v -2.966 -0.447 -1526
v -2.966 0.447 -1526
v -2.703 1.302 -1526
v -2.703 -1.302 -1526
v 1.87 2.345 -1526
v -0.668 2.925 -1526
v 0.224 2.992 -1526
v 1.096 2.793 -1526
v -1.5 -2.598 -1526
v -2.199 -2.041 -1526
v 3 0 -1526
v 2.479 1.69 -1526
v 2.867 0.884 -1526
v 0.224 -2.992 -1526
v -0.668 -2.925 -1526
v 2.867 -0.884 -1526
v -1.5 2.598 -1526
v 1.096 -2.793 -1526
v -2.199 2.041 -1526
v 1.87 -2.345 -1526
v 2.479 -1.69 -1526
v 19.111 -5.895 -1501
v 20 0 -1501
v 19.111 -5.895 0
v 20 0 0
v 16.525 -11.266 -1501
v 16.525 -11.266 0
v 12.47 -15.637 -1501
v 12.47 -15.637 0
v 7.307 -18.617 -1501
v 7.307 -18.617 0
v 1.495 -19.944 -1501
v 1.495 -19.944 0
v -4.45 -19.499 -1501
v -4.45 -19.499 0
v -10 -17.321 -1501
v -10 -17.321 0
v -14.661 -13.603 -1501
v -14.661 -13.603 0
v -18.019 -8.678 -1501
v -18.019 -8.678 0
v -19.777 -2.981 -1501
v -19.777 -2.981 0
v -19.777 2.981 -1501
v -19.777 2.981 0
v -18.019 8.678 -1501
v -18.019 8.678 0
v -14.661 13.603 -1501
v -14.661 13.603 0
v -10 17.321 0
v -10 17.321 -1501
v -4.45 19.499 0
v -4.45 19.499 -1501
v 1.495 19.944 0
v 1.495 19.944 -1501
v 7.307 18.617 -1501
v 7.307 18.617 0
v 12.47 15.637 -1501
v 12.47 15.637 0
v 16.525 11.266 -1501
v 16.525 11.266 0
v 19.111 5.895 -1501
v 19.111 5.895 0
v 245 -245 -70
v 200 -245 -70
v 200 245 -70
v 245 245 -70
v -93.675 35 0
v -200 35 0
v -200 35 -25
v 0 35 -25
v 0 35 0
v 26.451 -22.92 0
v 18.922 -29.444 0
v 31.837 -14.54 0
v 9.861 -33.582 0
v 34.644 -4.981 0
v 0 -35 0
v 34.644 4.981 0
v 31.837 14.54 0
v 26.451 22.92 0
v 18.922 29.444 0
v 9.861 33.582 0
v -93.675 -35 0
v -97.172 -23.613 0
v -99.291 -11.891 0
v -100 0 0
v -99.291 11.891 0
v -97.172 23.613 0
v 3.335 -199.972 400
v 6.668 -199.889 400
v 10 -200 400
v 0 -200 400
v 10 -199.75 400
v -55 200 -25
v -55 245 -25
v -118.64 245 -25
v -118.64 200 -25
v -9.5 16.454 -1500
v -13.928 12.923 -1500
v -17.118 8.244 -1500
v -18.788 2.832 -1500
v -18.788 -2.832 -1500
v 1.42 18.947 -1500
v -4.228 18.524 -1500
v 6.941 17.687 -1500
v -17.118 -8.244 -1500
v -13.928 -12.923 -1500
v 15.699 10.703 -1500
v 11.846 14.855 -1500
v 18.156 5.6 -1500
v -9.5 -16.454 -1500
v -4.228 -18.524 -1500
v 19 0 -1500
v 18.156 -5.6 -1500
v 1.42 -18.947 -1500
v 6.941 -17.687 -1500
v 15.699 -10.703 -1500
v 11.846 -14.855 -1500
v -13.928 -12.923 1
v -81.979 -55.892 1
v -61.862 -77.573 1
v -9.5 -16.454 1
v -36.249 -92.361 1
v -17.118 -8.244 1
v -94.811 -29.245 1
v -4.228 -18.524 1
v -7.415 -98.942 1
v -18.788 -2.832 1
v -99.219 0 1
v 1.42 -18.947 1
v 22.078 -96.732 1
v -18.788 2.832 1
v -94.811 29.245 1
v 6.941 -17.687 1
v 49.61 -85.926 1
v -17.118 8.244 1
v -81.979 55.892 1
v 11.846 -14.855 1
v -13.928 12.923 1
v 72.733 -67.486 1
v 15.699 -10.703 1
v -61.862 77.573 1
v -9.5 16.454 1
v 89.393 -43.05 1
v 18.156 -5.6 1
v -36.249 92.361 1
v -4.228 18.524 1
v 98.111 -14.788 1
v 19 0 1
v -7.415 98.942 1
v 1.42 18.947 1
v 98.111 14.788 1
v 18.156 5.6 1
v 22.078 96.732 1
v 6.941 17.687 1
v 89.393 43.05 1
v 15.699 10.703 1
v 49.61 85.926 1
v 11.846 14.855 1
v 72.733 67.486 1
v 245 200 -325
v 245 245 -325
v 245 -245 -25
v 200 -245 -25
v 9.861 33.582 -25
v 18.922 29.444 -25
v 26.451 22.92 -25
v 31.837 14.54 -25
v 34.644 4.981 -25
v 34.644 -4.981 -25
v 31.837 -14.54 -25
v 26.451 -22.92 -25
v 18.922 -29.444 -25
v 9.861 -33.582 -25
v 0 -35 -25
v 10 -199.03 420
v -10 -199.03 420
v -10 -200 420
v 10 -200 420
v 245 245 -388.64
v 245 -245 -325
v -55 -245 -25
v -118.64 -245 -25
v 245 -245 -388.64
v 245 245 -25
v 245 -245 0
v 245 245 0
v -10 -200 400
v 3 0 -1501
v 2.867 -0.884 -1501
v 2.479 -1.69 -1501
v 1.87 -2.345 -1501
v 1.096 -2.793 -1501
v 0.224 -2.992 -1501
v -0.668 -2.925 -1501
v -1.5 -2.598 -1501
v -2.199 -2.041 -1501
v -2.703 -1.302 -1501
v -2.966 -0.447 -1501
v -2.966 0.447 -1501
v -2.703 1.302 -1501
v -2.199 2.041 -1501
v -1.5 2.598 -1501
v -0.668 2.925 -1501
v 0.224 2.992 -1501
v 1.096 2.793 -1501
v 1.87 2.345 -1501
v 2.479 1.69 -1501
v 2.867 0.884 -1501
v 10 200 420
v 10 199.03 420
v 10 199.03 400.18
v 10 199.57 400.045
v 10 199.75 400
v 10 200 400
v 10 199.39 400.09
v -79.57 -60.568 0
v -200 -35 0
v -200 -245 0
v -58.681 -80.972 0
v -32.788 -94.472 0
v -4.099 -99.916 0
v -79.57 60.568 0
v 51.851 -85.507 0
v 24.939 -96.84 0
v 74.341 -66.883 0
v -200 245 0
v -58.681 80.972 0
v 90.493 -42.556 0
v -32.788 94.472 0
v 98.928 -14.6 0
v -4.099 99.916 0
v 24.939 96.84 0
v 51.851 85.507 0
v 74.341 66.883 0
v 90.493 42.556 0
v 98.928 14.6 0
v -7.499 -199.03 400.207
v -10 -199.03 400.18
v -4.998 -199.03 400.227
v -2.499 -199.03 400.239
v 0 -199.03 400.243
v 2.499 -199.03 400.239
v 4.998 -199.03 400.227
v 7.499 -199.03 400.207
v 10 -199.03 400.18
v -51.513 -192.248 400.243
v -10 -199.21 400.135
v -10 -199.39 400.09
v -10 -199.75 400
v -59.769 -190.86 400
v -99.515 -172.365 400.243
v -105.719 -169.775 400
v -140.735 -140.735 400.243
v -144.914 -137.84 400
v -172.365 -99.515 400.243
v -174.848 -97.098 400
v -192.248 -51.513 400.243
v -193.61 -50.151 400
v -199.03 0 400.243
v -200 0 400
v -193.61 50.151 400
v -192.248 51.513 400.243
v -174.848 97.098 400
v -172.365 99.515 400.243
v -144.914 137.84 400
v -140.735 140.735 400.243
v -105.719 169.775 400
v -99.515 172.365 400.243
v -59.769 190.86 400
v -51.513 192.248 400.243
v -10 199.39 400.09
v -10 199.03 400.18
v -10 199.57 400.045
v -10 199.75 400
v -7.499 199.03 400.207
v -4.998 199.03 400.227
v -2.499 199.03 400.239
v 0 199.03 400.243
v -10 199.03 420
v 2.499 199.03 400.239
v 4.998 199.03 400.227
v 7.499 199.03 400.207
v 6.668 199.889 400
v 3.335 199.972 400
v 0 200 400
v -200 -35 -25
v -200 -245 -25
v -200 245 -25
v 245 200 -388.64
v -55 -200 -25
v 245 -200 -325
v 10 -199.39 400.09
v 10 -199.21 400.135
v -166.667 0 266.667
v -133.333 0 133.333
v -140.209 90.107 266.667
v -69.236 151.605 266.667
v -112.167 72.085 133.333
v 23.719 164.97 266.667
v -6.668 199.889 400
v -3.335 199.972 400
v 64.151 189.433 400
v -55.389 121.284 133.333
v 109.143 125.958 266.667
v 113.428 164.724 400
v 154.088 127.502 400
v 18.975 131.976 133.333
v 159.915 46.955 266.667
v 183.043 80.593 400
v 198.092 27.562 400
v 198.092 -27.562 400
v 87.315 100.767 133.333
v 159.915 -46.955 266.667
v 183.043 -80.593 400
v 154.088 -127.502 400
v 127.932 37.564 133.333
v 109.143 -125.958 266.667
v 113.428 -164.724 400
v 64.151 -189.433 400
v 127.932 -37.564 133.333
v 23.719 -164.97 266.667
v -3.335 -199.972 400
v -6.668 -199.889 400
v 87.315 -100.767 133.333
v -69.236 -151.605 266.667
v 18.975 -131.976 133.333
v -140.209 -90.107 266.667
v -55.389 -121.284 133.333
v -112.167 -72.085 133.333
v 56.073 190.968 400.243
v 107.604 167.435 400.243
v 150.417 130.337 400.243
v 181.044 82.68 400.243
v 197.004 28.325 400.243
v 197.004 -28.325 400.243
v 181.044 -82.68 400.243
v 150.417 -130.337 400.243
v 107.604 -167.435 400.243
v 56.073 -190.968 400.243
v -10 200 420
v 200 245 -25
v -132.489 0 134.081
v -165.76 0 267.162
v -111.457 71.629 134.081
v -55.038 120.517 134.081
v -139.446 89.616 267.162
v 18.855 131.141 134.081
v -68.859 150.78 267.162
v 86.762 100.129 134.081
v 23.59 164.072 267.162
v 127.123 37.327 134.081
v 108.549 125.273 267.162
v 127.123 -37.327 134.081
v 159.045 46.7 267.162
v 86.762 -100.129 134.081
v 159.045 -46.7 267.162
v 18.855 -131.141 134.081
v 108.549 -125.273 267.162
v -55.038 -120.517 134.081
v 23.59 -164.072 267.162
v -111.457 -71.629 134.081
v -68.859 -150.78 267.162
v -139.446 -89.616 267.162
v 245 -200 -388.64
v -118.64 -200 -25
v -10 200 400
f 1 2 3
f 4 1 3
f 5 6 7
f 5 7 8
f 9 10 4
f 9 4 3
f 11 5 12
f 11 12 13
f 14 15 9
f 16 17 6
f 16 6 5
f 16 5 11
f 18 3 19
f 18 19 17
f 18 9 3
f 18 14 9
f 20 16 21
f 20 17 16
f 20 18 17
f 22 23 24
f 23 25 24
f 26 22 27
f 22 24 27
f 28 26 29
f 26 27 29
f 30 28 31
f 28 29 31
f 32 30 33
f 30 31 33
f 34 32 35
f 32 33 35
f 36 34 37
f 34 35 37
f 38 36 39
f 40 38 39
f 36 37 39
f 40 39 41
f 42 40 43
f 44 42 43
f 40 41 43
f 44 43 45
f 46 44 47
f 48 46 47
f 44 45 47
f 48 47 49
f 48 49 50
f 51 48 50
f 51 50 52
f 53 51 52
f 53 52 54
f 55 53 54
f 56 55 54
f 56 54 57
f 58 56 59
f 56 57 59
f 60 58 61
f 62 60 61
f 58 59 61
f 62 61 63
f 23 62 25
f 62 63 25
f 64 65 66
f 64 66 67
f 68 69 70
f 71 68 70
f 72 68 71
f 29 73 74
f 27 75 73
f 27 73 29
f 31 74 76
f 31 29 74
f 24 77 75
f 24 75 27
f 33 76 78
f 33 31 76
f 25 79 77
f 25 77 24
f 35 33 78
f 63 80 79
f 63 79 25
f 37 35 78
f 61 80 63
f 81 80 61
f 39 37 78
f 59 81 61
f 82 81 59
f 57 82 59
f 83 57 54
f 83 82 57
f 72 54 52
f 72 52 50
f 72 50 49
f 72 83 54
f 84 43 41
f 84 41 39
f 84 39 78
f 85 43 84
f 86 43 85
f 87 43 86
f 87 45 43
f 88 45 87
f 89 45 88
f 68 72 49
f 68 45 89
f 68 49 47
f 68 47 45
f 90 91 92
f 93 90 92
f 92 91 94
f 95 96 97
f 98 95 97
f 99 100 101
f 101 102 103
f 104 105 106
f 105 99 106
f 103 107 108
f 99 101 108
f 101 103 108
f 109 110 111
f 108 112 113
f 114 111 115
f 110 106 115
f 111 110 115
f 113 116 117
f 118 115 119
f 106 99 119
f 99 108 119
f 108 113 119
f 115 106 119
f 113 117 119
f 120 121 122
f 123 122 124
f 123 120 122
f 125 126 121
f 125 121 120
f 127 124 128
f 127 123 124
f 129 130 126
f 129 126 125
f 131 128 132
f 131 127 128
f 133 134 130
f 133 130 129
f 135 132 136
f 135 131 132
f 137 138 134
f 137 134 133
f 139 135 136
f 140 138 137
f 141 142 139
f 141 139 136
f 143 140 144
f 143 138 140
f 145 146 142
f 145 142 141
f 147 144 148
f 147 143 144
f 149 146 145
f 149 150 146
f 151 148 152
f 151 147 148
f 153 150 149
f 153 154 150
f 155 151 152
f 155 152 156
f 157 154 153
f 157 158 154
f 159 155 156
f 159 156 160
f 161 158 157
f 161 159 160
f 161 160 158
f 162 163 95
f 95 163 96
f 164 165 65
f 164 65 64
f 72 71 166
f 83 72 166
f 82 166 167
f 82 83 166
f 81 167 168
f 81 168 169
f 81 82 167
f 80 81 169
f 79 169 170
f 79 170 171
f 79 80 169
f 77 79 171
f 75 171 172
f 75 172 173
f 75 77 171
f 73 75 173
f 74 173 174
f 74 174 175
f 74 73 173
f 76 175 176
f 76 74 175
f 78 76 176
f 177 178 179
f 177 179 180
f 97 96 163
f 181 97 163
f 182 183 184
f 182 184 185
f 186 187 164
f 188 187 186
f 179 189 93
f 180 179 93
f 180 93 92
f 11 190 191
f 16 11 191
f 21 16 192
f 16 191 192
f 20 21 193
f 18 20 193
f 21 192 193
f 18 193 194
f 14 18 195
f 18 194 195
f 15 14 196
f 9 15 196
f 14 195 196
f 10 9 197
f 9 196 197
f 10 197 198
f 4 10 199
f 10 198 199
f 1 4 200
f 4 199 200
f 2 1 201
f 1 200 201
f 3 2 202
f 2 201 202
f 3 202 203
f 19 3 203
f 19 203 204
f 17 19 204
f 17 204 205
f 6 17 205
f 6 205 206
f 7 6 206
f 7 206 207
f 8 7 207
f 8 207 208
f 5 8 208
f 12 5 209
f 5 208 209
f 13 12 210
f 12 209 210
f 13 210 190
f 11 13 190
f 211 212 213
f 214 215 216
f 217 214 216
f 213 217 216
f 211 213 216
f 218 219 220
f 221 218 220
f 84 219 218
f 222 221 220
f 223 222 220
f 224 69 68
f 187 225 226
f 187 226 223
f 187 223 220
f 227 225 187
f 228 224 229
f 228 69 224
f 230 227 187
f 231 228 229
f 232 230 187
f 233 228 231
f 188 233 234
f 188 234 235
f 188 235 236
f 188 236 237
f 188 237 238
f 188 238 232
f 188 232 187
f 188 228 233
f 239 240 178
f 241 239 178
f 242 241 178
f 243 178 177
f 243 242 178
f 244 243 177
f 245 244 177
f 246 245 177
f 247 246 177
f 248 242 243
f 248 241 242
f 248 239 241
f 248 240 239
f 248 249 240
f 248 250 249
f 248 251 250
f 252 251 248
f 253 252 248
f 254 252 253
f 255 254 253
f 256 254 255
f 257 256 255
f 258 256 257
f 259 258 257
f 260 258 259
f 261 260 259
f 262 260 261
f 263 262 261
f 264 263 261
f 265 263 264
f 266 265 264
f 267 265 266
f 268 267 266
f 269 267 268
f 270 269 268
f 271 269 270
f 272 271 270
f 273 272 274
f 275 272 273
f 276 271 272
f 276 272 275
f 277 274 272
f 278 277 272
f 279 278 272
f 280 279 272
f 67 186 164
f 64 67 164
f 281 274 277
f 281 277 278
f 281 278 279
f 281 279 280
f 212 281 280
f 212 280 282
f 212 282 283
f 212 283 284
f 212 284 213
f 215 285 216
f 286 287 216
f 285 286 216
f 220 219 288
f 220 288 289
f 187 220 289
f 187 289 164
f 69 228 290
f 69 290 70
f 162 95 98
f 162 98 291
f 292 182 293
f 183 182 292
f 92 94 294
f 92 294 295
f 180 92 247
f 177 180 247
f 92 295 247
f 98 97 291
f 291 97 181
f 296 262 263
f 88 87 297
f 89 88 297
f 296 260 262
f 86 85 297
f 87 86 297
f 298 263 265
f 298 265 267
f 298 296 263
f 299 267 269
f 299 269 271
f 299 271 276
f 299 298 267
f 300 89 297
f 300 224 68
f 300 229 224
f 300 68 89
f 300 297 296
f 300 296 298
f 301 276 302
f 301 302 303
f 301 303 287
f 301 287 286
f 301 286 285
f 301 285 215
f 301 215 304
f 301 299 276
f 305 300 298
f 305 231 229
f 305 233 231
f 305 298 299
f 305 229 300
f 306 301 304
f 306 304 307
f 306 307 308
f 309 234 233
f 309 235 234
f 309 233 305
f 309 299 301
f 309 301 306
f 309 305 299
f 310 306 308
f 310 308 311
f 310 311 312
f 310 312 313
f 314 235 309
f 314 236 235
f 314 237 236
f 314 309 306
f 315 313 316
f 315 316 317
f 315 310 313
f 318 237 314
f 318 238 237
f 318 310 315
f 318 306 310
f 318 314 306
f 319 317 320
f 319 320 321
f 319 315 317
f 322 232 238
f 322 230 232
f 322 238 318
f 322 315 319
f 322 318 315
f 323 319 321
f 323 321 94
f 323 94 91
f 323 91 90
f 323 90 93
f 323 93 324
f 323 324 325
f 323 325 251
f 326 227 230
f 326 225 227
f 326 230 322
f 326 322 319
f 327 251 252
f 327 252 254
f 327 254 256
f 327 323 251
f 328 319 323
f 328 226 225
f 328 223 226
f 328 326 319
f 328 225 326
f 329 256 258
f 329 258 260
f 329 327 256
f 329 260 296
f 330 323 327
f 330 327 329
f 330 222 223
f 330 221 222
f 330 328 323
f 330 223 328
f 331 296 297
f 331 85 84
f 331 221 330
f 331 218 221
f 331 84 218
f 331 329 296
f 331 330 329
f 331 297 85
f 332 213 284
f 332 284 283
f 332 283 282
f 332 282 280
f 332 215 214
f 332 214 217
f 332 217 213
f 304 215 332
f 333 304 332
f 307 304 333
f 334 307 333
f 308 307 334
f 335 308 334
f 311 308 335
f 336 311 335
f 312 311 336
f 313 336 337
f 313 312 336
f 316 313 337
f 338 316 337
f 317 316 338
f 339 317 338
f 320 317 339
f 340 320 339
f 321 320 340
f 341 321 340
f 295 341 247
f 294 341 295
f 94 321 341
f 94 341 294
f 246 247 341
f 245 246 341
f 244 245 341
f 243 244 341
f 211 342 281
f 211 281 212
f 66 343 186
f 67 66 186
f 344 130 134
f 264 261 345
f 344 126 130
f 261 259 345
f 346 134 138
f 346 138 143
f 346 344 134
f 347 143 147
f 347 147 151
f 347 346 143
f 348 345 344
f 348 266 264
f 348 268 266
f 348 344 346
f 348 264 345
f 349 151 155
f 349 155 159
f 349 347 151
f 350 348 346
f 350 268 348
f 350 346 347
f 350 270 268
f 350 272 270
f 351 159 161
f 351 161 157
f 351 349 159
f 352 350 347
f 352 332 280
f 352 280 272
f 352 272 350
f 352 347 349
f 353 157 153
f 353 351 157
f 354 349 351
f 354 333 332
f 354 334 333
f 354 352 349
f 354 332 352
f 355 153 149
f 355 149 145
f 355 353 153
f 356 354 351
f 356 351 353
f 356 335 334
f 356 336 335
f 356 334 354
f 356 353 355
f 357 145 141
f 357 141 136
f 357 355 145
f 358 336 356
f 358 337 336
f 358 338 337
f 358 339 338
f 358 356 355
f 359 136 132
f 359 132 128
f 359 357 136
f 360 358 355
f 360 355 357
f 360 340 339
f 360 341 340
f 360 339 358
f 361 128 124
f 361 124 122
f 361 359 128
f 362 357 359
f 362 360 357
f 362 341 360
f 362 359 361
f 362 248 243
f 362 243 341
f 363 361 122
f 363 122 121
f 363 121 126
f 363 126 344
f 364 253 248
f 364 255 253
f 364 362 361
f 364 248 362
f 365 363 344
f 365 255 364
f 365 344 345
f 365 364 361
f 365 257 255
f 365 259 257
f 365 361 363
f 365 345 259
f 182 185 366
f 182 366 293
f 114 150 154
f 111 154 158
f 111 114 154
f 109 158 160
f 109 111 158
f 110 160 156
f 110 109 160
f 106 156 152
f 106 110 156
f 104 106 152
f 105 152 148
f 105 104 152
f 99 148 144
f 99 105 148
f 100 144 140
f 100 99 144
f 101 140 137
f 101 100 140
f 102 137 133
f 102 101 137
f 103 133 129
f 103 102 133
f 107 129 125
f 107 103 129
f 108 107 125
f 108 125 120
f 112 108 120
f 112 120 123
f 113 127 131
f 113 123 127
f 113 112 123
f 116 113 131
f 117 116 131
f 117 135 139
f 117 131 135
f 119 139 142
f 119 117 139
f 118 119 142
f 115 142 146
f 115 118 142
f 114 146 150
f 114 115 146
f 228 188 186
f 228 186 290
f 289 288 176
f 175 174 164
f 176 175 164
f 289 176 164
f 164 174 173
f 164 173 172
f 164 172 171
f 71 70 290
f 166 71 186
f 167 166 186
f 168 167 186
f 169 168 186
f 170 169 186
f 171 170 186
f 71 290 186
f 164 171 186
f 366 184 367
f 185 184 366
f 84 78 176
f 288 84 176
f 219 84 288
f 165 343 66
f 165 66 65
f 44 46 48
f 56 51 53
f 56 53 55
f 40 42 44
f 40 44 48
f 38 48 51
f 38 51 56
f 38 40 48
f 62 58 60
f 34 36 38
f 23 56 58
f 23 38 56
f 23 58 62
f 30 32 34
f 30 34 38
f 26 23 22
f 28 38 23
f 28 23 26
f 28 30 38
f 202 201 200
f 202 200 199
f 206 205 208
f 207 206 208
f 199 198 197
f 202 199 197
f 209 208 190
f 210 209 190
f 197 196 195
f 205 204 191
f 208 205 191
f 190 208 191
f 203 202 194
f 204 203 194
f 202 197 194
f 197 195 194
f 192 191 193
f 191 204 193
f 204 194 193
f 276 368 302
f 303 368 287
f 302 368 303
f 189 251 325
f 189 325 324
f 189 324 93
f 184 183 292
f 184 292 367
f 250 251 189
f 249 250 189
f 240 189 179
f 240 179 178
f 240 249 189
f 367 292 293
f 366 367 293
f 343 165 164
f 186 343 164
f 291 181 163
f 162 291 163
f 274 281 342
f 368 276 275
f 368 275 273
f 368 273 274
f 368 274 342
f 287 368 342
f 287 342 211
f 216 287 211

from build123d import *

# Parameters (mm, degrees)
F5_R      = 20
F5_R_2    = 19
F6_DEPTH  = 1500
F7_R      = 19
F8_DEPTH  = 400.243535625
F10_W     = 20
F10_H     = 0.9701425001
F11_DEPTH = 20
F12_R     = 20
F13_DEPTH = 1
F14_R     = 3
F15_DEPTH = 25
F17_DEPTH = 25
F18_W     = 45
F18_H     = 490
F19_DEPTH = 45
F21_DEPTH = 45


with BuildPart() as f4:
    # F3 (on Front) → F4 (revolve)
    with BuildSketch(Plane.XZ):
        Polygon((-199.0298574999, 400.242535625), (-200, 400), (-100, 0), (0, 0), (0, 1), (-99.2192235936, 1), align=None)
    revolve(axis=Axis((0, 0, 11.2295082571), (0, 0, -1)))

    # F5 (on Top) → F6 (join)
    with BuildSketch(Plane.XY):
        Circle(F5_R)
        Circle(F5_R_2, mode=Mode.SUBTRACT)
    extrude(amount=-F6_DEPTH)

    # F7 (on Top) → F8 (cut, through all)
    with BuildSketch(Plane.XY):
        Circle(F7_R)
    extrude(amount=F8_DEPTH, mode=Mode.SUBTRACT)

    # F10 (on offset) → F11 (join)
    with BuildSketch(Plane.XY.offset(400)):
        with Locations((0, -199.5149287499)):
            Rectangle(F10_W, F10_H)
        with Locations((0, 199.5149287499)):
            Rectangle(F10_W, F10_H)
    extrude(amount=F11_DEPTH)

    # F12 (on face) → F13 (join)
    with BuildSketch(Plane(origin=(0, 0, -1500), x_dir=(1, 0, 0), z_dir=(0, 0, -1))):
        Circle(F12_R)
    extrude(amount=F13_DEPTH)

    # F16 (on Top) → F17 (join)
    with BuildSketch(Plane.XY):
        with BuildLine():
            Line((-200, -245), (245, -245))
            Line((245, -245), (245, 245))
            Line((245, 245), (-200, 245))
            Line((-200, 245), (-200, 35))
            Line((-200, 35), (0, 35))
            ThreePointArc((0, 35), (35, 0), (0, -35))
            Line((0, -35), (-200, -35))
            Line((-200, -35), (-200, -245))
        make_face()
    extrude(amount=-F17_DEPTH)


with BuildPart() as f15:
    # F14 (on face) → F15 (new body)
    with BuildSketch(Plane(origin=(0, 0, -1501), x_dir=(1, 0, 0), z_dir=(0, 0, -1))):
        Circle(F14_R)
    extrude(amount=F15_DEPTH)


with BuildPart() as f19:
    # F18 (on face) → F19 (new body)
    with BuildSketch(Plane(origin=(0, 0, -25), x_dir=(1, 0, 0), z_dir=(0, 0, -1))):
        with Locations((222.5, 0)):
            Rectangle(F18_W, F18_H)
    extrude(amount=F19_DEPTH)


with BuildPart() as f21:
    # F20 (on face) → F21 (new body)
    with BuildSketch(Plane.XZ.offset(245)):
        Polygon((-55, -25), (-118.6396103068, -25), (245, -388.6396103068), (245, -325), align=None)
    extrude(amount=-F21_DEPTH)


with BuildPart() as f22_1:
    # F22: instance of F21
    add(f21.part.mirror(Plane.XZ))


solid = Compound([f4.part, f15.part, f19.part, f21.part, f22_1.part])
